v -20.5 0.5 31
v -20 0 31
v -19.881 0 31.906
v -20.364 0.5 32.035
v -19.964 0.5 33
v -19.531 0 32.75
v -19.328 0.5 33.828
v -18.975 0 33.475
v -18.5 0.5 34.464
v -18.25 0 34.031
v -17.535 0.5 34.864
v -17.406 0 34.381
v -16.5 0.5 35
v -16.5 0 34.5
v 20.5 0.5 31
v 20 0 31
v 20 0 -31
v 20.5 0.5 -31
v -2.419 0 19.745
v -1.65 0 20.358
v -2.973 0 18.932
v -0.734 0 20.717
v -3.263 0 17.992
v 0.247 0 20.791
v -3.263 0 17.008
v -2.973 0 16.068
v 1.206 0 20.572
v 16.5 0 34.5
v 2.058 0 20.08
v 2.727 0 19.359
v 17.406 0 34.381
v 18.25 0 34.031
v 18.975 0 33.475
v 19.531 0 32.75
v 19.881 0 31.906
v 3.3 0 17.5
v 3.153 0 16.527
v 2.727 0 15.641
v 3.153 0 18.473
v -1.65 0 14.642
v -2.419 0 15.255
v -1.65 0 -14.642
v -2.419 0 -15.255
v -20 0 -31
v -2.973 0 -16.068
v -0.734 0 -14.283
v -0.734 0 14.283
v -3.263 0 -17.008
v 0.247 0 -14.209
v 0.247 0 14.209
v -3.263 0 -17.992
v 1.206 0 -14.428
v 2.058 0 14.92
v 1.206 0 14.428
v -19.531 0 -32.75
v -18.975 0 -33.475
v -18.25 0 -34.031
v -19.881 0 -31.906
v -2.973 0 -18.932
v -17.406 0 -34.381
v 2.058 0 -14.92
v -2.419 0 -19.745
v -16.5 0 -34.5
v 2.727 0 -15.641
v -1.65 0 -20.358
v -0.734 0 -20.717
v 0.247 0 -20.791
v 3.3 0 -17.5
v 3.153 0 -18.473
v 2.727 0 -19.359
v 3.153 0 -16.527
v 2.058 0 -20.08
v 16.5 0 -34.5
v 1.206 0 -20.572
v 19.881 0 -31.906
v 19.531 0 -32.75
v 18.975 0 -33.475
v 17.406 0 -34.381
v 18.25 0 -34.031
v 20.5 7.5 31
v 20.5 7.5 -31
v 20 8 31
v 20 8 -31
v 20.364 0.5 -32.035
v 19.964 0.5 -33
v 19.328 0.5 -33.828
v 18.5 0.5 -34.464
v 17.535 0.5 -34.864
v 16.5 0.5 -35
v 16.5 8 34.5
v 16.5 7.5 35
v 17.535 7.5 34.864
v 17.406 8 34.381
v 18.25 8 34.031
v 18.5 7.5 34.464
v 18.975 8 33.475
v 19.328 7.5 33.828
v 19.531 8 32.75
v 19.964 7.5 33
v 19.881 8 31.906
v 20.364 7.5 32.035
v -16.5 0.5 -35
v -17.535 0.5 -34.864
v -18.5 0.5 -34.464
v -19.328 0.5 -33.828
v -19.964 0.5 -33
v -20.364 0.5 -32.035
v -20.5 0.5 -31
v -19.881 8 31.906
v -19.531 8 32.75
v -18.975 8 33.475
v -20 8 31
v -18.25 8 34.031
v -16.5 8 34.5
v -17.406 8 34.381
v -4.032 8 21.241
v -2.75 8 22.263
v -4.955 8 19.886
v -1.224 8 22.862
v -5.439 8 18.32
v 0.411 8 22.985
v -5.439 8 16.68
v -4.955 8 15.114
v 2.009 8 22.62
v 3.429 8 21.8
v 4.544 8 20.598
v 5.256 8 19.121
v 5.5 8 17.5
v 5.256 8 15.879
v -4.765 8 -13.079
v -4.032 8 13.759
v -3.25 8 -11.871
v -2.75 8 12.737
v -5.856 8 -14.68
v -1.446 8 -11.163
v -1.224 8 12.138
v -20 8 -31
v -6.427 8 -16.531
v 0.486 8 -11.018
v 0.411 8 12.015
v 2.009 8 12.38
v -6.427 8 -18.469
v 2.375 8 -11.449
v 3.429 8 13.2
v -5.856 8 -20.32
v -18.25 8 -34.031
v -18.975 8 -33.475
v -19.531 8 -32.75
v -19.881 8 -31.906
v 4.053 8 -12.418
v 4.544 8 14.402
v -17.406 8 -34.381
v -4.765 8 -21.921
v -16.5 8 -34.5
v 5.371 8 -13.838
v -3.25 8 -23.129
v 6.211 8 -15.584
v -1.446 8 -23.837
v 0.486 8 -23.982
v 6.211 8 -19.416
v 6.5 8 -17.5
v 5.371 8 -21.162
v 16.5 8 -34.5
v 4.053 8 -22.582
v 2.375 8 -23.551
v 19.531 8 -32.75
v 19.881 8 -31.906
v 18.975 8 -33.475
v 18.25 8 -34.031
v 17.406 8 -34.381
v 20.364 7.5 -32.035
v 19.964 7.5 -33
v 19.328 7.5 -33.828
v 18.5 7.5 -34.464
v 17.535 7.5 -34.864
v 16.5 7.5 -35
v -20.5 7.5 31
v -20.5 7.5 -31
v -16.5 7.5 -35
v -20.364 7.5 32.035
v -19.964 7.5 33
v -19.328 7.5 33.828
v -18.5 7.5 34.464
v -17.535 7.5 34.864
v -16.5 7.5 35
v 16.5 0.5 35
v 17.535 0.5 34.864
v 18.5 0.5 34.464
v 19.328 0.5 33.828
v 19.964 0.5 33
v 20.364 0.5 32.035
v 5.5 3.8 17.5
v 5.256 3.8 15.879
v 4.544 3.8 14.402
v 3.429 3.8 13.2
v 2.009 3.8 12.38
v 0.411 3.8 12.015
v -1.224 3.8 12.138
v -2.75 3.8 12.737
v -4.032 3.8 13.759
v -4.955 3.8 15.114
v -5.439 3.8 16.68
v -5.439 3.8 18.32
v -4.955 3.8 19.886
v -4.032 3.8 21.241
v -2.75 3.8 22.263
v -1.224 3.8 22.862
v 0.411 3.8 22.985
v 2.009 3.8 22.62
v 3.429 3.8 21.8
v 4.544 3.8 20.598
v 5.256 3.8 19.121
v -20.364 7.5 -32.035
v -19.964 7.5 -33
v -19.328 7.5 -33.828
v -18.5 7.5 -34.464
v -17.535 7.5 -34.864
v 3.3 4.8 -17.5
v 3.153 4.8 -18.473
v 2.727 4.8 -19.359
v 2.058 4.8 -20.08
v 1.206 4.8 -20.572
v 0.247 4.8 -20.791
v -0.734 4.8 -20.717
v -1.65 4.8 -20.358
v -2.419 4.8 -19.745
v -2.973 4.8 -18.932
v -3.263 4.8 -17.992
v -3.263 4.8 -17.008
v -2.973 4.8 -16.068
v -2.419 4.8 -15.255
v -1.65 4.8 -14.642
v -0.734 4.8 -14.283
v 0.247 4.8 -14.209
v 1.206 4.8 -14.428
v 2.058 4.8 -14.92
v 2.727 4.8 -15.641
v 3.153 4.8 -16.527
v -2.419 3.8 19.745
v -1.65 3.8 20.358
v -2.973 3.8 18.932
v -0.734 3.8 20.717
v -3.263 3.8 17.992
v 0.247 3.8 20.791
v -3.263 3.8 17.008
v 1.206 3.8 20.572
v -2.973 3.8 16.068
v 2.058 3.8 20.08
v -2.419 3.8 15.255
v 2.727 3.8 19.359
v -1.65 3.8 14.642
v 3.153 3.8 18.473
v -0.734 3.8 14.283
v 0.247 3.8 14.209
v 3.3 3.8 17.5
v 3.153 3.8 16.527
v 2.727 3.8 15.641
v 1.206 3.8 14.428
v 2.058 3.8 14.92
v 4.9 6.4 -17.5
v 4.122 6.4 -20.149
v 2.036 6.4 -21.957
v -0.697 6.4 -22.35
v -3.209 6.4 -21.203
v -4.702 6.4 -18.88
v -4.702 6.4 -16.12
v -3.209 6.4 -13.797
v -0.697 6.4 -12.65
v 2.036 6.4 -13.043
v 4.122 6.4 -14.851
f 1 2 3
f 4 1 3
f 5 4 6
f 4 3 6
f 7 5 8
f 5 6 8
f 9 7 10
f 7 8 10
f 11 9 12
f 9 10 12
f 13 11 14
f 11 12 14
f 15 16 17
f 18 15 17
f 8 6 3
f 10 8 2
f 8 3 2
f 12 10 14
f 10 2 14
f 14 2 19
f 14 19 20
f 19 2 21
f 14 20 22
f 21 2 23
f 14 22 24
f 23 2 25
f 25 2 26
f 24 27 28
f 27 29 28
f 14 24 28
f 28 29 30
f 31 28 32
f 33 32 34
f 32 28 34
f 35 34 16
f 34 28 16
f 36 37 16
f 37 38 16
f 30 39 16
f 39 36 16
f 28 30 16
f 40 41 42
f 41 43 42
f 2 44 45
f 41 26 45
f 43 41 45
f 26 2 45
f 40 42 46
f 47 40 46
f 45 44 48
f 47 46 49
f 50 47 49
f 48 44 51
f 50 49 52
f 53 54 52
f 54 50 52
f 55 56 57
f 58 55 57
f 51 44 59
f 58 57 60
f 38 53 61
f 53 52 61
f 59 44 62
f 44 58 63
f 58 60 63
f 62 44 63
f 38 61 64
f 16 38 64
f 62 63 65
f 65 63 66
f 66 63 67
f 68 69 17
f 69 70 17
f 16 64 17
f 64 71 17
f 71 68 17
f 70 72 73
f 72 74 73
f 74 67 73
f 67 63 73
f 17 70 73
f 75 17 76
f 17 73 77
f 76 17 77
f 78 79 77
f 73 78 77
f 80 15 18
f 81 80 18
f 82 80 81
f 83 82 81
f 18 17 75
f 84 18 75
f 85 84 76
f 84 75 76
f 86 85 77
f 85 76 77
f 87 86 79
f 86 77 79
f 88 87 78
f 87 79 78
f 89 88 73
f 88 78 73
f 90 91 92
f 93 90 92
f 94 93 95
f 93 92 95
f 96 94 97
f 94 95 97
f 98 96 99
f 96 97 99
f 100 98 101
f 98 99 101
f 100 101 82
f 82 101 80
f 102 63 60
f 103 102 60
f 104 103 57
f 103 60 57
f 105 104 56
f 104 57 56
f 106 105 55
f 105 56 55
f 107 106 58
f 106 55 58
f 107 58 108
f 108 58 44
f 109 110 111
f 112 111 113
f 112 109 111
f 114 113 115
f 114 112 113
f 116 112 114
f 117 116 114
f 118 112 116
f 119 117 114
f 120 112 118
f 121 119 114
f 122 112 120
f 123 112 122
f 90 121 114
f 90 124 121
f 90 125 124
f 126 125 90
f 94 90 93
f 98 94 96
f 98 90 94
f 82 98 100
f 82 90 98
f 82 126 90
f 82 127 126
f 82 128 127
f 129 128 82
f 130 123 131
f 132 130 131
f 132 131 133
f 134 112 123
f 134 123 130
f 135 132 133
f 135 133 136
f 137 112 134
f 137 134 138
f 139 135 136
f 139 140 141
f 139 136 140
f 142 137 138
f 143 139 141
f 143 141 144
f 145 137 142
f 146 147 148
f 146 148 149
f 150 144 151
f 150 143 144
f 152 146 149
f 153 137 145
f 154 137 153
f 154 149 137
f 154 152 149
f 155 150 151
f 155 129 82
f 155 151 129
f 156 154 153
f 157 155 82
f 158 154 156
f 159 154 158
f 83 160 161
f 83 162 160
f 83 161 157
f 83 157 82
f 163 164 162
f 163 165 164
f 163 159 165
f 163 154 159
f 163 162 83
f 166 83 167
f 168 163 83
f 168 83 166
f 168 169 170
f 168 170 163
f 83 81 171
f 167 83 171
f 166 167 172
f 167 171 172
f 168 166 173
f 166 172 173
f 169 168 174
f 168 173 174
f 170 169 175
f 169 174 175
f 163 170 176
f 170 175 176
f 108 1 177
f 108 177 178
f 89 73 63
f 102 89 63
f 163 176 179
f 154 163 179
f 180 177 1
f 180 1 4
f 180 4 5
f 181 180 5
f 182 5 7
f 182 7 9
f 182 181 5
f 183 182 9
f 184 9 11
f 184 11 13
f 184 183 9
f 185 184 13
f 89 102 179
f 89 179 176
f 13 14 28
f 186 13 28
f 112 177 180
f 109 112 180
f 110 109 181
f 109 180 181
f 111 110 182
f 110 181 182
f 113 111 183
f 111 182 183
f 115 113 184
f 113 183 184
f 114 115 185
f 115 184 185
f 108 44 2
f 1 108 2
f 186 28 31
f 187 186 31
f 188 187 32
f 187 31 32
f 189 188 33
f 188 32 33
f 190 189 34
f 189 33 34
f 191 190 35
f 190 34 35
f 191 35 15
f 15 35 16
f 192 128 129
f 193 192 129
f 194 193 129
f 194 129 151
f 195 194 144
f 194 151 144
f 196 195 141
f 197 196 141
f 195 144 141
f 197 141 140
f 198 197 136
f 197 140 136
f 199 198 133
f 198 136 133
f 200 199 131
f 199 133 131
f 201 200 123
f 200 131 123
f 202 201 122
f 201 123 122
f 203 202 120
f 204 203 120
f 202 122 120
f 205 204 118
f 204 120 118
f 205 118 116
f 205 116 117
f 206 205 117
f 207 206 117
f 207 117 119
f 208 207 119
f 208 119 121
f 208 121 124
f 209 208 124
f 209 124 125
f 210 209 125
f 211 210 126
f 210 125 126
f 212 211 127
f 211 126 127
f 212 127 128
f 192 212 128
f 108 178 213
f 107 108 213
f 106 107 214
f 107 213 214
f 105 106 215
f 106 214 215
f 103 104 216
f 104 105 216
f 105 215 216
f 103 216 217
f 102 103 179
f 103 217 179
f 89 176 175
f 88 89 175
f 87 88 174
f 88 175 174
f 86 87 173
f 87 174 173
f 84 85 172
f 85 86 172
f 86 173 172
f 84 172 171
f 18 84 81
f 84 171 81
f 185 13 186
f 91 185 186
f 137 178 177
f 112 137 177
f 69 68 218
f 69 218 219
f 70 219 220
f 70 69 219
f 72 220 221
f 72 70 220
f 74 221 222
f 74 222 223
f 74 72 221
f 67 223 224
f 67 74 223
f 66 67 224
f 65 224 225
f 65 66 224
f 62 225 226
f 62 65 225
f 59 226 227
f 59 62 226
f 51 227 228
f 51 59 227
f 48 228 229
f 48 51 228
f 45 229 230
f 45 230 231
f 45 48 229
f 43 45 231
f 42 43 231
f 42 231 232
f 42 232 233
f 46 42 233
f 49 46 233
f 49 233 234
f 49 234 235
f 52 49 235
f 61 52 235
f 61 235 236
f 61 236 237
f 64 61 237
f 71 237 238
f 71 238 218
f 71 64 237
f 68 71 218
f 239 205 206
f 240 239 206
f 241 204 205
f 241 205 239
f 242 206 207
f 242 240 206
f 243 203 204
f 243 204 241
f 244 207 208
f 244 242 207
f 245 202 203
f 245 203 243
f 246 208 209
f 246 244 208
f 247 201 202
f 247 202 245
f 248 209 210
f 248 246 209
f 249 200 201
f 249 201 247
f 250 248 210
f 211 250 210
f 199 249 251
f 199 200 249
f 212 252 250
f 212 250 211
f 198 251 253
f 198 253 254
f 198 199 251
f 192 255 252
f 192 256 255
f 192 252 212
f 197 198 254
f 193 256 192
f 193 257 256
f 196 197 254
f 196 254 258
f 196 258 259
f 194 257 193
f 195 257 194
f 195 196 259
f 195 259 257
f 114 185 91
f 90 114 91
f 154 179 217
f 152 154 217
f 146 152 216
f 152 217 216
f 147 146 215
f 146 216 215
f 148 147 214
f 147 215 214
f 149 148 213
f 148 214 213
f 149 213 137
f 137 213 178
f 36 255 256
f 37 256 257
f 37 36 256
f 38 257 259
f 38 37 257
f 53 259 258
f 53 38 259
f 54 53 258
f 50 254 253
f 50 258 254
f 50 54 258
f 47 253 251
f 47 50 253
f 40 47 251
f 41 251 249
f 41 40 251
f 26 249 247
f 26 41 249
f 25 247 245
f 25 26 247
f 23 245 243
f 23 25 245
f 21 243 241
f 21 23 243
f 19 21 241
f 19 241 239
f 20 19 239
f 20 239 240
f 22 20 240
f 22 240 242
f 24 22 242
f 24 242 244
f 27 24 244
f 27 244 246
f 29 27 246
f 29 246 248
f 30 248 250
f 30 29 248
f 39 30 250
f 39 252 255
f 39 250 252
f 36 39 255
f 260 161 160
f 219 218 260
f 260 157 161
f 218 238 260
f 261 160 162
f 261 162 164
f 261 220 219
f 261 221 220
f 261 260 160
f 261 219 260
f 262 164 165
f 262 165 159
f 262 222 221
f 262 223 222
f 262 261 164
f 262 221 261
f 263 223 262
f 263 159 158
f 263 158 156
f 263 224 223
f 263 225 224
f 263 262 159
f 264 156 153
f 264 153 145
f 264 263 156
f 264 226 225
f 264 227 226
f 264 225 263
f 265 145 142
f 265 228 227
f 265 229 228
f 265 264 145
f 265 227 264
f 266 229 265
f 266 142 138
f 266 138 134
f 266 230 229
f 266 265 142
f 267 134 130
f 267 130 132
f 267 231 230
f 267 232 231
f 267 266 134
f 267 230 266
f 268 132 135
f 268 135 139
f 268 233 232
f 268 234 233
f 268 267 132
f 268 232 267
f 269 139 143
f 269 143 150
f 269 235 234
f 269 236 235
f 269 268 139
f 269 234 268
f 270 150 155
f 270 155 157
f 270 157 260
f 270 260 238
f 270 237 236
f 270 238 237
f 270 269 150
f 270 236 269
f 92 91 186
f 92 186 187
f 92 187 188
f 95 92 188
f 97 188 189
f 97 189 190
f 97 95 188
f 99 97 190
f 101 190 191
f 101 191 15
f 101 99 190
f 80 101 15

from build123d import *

# Parameters (mm, degrees)
SKETCH1_W           = 41
SKETCH1_H           = 70
SKETCH1_R           = 3.3
BOSS_EXTRUDE1_DEPTH = 8
SKETCH2_R           = 5.5
CUT_EXTRUDE1_DEPTH  = 4.2
CHAMFER2_SIZE       = 3.2
FILLET1_R           = 4
CHAMFER4_SIZE       = 0.5


with BuildPart() as part:
    # Sketch1 → Boss-Extrude1 (new body)
    with BuildSketch(Plane(origin=(0, 0, 0), x_dir=(1, 0, 0), z_dir=(0, 1, 0))):
        Rectangle(SKETCH1_W, SKETCH1_H)
        with Locations((0, 17.5)):
            Circle(SKETCH1_R, mode=Mode.SUBTRACT)
        with Locations((0, -17.5)):
            Circle(SKETCH1_R, mode=Mode.SUBTRACT)
    extrude(amount=BOSS_EXTRUDE1_DEPTH)

    # Sketch2 → Cut-Extrude1 (cut)
    with BuildSketch(Plane(origin=(0, 8, 0), x_dir=(1, 0, 0), z_dir=(0, 1, 0))):
        with Locations((0, -17.5)):
            Circle(SKETCH2_R)
    extrude(amount=-CUT_EXTRUDE1_DEPTH, mode=Mode.SUBTRACT)

    # Chamfer2
    chamfer2_edges = [part.edges().sort_by_distance(p)[0] for p in [
        (-3.3, 8, -17.5),
    ]]
    chamfer(chamfer2_edges, length=CHAMFER2_SIZE)

    # Fillet1
    fillet1_edges = [part.edges().sort_by_distance(p)[0] for p in [
        (20.5, 4, 35),
        (-20.5, 4, 35),
        (-20.5, 4, -35),
        (20.5, 4, -35),
    ]]
    fillet(fillet1_edges, radius=FILLET1_R)

    # Chamfer4
    chamfer4_edges = [part.edges().sort_by_distance(p)[0] for p in [
        (0, 0, 35),
        (0, 8, 35),
        (20.5, 0, 0),
        (-20.5, 0, 0),
        (0, 0, -35),
        (-19.328427125, 0, -33.828427125),
        (19.328427125, 0, -33.828427125),
        (19.328427125, 0, 33.828427125),
        (-19.328427125, 0, 33.828427125),
        (-20.5, 8, 0),
        (20.5, 8, 0),
        (0, 8, -35),
        (-19.328427125, 8, -33.828427125),
        (19.328427125, 8, -33.828427125),
        (19.328427125, 8, 33.828427125),
        (-19.328427125, 8, 33.828427125),
    ]]
    chamfer(chamfer4_edges, length=CHAMFER4_SIZE)


solid = part.part
